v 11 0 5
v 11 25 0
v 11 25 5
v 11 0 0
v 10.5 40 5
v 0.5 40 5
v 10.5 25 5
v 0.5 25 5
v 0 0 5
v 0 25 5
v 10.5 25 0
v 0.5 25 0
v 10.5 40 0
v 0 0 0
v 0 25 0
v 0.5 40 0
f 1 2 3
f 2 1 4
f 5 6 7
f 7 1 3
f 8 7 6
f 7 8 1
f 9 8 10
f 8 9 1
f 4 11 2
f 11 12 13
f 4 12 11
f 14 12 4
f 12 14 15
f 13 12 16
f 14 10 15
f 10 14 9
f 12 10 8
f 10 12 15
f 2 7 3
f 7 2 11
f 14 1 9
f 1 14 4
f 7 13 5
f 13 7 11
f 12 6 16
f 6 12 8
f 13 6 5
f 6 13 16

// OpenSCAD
$fa=4; // default minimum facet angle is now 4
$fs=0.05; // default minimum facet size is now 0.05 mm


cube([11, 25, 5]);
translate([.5, 0, 0]) cube([10, 40, 5]);
